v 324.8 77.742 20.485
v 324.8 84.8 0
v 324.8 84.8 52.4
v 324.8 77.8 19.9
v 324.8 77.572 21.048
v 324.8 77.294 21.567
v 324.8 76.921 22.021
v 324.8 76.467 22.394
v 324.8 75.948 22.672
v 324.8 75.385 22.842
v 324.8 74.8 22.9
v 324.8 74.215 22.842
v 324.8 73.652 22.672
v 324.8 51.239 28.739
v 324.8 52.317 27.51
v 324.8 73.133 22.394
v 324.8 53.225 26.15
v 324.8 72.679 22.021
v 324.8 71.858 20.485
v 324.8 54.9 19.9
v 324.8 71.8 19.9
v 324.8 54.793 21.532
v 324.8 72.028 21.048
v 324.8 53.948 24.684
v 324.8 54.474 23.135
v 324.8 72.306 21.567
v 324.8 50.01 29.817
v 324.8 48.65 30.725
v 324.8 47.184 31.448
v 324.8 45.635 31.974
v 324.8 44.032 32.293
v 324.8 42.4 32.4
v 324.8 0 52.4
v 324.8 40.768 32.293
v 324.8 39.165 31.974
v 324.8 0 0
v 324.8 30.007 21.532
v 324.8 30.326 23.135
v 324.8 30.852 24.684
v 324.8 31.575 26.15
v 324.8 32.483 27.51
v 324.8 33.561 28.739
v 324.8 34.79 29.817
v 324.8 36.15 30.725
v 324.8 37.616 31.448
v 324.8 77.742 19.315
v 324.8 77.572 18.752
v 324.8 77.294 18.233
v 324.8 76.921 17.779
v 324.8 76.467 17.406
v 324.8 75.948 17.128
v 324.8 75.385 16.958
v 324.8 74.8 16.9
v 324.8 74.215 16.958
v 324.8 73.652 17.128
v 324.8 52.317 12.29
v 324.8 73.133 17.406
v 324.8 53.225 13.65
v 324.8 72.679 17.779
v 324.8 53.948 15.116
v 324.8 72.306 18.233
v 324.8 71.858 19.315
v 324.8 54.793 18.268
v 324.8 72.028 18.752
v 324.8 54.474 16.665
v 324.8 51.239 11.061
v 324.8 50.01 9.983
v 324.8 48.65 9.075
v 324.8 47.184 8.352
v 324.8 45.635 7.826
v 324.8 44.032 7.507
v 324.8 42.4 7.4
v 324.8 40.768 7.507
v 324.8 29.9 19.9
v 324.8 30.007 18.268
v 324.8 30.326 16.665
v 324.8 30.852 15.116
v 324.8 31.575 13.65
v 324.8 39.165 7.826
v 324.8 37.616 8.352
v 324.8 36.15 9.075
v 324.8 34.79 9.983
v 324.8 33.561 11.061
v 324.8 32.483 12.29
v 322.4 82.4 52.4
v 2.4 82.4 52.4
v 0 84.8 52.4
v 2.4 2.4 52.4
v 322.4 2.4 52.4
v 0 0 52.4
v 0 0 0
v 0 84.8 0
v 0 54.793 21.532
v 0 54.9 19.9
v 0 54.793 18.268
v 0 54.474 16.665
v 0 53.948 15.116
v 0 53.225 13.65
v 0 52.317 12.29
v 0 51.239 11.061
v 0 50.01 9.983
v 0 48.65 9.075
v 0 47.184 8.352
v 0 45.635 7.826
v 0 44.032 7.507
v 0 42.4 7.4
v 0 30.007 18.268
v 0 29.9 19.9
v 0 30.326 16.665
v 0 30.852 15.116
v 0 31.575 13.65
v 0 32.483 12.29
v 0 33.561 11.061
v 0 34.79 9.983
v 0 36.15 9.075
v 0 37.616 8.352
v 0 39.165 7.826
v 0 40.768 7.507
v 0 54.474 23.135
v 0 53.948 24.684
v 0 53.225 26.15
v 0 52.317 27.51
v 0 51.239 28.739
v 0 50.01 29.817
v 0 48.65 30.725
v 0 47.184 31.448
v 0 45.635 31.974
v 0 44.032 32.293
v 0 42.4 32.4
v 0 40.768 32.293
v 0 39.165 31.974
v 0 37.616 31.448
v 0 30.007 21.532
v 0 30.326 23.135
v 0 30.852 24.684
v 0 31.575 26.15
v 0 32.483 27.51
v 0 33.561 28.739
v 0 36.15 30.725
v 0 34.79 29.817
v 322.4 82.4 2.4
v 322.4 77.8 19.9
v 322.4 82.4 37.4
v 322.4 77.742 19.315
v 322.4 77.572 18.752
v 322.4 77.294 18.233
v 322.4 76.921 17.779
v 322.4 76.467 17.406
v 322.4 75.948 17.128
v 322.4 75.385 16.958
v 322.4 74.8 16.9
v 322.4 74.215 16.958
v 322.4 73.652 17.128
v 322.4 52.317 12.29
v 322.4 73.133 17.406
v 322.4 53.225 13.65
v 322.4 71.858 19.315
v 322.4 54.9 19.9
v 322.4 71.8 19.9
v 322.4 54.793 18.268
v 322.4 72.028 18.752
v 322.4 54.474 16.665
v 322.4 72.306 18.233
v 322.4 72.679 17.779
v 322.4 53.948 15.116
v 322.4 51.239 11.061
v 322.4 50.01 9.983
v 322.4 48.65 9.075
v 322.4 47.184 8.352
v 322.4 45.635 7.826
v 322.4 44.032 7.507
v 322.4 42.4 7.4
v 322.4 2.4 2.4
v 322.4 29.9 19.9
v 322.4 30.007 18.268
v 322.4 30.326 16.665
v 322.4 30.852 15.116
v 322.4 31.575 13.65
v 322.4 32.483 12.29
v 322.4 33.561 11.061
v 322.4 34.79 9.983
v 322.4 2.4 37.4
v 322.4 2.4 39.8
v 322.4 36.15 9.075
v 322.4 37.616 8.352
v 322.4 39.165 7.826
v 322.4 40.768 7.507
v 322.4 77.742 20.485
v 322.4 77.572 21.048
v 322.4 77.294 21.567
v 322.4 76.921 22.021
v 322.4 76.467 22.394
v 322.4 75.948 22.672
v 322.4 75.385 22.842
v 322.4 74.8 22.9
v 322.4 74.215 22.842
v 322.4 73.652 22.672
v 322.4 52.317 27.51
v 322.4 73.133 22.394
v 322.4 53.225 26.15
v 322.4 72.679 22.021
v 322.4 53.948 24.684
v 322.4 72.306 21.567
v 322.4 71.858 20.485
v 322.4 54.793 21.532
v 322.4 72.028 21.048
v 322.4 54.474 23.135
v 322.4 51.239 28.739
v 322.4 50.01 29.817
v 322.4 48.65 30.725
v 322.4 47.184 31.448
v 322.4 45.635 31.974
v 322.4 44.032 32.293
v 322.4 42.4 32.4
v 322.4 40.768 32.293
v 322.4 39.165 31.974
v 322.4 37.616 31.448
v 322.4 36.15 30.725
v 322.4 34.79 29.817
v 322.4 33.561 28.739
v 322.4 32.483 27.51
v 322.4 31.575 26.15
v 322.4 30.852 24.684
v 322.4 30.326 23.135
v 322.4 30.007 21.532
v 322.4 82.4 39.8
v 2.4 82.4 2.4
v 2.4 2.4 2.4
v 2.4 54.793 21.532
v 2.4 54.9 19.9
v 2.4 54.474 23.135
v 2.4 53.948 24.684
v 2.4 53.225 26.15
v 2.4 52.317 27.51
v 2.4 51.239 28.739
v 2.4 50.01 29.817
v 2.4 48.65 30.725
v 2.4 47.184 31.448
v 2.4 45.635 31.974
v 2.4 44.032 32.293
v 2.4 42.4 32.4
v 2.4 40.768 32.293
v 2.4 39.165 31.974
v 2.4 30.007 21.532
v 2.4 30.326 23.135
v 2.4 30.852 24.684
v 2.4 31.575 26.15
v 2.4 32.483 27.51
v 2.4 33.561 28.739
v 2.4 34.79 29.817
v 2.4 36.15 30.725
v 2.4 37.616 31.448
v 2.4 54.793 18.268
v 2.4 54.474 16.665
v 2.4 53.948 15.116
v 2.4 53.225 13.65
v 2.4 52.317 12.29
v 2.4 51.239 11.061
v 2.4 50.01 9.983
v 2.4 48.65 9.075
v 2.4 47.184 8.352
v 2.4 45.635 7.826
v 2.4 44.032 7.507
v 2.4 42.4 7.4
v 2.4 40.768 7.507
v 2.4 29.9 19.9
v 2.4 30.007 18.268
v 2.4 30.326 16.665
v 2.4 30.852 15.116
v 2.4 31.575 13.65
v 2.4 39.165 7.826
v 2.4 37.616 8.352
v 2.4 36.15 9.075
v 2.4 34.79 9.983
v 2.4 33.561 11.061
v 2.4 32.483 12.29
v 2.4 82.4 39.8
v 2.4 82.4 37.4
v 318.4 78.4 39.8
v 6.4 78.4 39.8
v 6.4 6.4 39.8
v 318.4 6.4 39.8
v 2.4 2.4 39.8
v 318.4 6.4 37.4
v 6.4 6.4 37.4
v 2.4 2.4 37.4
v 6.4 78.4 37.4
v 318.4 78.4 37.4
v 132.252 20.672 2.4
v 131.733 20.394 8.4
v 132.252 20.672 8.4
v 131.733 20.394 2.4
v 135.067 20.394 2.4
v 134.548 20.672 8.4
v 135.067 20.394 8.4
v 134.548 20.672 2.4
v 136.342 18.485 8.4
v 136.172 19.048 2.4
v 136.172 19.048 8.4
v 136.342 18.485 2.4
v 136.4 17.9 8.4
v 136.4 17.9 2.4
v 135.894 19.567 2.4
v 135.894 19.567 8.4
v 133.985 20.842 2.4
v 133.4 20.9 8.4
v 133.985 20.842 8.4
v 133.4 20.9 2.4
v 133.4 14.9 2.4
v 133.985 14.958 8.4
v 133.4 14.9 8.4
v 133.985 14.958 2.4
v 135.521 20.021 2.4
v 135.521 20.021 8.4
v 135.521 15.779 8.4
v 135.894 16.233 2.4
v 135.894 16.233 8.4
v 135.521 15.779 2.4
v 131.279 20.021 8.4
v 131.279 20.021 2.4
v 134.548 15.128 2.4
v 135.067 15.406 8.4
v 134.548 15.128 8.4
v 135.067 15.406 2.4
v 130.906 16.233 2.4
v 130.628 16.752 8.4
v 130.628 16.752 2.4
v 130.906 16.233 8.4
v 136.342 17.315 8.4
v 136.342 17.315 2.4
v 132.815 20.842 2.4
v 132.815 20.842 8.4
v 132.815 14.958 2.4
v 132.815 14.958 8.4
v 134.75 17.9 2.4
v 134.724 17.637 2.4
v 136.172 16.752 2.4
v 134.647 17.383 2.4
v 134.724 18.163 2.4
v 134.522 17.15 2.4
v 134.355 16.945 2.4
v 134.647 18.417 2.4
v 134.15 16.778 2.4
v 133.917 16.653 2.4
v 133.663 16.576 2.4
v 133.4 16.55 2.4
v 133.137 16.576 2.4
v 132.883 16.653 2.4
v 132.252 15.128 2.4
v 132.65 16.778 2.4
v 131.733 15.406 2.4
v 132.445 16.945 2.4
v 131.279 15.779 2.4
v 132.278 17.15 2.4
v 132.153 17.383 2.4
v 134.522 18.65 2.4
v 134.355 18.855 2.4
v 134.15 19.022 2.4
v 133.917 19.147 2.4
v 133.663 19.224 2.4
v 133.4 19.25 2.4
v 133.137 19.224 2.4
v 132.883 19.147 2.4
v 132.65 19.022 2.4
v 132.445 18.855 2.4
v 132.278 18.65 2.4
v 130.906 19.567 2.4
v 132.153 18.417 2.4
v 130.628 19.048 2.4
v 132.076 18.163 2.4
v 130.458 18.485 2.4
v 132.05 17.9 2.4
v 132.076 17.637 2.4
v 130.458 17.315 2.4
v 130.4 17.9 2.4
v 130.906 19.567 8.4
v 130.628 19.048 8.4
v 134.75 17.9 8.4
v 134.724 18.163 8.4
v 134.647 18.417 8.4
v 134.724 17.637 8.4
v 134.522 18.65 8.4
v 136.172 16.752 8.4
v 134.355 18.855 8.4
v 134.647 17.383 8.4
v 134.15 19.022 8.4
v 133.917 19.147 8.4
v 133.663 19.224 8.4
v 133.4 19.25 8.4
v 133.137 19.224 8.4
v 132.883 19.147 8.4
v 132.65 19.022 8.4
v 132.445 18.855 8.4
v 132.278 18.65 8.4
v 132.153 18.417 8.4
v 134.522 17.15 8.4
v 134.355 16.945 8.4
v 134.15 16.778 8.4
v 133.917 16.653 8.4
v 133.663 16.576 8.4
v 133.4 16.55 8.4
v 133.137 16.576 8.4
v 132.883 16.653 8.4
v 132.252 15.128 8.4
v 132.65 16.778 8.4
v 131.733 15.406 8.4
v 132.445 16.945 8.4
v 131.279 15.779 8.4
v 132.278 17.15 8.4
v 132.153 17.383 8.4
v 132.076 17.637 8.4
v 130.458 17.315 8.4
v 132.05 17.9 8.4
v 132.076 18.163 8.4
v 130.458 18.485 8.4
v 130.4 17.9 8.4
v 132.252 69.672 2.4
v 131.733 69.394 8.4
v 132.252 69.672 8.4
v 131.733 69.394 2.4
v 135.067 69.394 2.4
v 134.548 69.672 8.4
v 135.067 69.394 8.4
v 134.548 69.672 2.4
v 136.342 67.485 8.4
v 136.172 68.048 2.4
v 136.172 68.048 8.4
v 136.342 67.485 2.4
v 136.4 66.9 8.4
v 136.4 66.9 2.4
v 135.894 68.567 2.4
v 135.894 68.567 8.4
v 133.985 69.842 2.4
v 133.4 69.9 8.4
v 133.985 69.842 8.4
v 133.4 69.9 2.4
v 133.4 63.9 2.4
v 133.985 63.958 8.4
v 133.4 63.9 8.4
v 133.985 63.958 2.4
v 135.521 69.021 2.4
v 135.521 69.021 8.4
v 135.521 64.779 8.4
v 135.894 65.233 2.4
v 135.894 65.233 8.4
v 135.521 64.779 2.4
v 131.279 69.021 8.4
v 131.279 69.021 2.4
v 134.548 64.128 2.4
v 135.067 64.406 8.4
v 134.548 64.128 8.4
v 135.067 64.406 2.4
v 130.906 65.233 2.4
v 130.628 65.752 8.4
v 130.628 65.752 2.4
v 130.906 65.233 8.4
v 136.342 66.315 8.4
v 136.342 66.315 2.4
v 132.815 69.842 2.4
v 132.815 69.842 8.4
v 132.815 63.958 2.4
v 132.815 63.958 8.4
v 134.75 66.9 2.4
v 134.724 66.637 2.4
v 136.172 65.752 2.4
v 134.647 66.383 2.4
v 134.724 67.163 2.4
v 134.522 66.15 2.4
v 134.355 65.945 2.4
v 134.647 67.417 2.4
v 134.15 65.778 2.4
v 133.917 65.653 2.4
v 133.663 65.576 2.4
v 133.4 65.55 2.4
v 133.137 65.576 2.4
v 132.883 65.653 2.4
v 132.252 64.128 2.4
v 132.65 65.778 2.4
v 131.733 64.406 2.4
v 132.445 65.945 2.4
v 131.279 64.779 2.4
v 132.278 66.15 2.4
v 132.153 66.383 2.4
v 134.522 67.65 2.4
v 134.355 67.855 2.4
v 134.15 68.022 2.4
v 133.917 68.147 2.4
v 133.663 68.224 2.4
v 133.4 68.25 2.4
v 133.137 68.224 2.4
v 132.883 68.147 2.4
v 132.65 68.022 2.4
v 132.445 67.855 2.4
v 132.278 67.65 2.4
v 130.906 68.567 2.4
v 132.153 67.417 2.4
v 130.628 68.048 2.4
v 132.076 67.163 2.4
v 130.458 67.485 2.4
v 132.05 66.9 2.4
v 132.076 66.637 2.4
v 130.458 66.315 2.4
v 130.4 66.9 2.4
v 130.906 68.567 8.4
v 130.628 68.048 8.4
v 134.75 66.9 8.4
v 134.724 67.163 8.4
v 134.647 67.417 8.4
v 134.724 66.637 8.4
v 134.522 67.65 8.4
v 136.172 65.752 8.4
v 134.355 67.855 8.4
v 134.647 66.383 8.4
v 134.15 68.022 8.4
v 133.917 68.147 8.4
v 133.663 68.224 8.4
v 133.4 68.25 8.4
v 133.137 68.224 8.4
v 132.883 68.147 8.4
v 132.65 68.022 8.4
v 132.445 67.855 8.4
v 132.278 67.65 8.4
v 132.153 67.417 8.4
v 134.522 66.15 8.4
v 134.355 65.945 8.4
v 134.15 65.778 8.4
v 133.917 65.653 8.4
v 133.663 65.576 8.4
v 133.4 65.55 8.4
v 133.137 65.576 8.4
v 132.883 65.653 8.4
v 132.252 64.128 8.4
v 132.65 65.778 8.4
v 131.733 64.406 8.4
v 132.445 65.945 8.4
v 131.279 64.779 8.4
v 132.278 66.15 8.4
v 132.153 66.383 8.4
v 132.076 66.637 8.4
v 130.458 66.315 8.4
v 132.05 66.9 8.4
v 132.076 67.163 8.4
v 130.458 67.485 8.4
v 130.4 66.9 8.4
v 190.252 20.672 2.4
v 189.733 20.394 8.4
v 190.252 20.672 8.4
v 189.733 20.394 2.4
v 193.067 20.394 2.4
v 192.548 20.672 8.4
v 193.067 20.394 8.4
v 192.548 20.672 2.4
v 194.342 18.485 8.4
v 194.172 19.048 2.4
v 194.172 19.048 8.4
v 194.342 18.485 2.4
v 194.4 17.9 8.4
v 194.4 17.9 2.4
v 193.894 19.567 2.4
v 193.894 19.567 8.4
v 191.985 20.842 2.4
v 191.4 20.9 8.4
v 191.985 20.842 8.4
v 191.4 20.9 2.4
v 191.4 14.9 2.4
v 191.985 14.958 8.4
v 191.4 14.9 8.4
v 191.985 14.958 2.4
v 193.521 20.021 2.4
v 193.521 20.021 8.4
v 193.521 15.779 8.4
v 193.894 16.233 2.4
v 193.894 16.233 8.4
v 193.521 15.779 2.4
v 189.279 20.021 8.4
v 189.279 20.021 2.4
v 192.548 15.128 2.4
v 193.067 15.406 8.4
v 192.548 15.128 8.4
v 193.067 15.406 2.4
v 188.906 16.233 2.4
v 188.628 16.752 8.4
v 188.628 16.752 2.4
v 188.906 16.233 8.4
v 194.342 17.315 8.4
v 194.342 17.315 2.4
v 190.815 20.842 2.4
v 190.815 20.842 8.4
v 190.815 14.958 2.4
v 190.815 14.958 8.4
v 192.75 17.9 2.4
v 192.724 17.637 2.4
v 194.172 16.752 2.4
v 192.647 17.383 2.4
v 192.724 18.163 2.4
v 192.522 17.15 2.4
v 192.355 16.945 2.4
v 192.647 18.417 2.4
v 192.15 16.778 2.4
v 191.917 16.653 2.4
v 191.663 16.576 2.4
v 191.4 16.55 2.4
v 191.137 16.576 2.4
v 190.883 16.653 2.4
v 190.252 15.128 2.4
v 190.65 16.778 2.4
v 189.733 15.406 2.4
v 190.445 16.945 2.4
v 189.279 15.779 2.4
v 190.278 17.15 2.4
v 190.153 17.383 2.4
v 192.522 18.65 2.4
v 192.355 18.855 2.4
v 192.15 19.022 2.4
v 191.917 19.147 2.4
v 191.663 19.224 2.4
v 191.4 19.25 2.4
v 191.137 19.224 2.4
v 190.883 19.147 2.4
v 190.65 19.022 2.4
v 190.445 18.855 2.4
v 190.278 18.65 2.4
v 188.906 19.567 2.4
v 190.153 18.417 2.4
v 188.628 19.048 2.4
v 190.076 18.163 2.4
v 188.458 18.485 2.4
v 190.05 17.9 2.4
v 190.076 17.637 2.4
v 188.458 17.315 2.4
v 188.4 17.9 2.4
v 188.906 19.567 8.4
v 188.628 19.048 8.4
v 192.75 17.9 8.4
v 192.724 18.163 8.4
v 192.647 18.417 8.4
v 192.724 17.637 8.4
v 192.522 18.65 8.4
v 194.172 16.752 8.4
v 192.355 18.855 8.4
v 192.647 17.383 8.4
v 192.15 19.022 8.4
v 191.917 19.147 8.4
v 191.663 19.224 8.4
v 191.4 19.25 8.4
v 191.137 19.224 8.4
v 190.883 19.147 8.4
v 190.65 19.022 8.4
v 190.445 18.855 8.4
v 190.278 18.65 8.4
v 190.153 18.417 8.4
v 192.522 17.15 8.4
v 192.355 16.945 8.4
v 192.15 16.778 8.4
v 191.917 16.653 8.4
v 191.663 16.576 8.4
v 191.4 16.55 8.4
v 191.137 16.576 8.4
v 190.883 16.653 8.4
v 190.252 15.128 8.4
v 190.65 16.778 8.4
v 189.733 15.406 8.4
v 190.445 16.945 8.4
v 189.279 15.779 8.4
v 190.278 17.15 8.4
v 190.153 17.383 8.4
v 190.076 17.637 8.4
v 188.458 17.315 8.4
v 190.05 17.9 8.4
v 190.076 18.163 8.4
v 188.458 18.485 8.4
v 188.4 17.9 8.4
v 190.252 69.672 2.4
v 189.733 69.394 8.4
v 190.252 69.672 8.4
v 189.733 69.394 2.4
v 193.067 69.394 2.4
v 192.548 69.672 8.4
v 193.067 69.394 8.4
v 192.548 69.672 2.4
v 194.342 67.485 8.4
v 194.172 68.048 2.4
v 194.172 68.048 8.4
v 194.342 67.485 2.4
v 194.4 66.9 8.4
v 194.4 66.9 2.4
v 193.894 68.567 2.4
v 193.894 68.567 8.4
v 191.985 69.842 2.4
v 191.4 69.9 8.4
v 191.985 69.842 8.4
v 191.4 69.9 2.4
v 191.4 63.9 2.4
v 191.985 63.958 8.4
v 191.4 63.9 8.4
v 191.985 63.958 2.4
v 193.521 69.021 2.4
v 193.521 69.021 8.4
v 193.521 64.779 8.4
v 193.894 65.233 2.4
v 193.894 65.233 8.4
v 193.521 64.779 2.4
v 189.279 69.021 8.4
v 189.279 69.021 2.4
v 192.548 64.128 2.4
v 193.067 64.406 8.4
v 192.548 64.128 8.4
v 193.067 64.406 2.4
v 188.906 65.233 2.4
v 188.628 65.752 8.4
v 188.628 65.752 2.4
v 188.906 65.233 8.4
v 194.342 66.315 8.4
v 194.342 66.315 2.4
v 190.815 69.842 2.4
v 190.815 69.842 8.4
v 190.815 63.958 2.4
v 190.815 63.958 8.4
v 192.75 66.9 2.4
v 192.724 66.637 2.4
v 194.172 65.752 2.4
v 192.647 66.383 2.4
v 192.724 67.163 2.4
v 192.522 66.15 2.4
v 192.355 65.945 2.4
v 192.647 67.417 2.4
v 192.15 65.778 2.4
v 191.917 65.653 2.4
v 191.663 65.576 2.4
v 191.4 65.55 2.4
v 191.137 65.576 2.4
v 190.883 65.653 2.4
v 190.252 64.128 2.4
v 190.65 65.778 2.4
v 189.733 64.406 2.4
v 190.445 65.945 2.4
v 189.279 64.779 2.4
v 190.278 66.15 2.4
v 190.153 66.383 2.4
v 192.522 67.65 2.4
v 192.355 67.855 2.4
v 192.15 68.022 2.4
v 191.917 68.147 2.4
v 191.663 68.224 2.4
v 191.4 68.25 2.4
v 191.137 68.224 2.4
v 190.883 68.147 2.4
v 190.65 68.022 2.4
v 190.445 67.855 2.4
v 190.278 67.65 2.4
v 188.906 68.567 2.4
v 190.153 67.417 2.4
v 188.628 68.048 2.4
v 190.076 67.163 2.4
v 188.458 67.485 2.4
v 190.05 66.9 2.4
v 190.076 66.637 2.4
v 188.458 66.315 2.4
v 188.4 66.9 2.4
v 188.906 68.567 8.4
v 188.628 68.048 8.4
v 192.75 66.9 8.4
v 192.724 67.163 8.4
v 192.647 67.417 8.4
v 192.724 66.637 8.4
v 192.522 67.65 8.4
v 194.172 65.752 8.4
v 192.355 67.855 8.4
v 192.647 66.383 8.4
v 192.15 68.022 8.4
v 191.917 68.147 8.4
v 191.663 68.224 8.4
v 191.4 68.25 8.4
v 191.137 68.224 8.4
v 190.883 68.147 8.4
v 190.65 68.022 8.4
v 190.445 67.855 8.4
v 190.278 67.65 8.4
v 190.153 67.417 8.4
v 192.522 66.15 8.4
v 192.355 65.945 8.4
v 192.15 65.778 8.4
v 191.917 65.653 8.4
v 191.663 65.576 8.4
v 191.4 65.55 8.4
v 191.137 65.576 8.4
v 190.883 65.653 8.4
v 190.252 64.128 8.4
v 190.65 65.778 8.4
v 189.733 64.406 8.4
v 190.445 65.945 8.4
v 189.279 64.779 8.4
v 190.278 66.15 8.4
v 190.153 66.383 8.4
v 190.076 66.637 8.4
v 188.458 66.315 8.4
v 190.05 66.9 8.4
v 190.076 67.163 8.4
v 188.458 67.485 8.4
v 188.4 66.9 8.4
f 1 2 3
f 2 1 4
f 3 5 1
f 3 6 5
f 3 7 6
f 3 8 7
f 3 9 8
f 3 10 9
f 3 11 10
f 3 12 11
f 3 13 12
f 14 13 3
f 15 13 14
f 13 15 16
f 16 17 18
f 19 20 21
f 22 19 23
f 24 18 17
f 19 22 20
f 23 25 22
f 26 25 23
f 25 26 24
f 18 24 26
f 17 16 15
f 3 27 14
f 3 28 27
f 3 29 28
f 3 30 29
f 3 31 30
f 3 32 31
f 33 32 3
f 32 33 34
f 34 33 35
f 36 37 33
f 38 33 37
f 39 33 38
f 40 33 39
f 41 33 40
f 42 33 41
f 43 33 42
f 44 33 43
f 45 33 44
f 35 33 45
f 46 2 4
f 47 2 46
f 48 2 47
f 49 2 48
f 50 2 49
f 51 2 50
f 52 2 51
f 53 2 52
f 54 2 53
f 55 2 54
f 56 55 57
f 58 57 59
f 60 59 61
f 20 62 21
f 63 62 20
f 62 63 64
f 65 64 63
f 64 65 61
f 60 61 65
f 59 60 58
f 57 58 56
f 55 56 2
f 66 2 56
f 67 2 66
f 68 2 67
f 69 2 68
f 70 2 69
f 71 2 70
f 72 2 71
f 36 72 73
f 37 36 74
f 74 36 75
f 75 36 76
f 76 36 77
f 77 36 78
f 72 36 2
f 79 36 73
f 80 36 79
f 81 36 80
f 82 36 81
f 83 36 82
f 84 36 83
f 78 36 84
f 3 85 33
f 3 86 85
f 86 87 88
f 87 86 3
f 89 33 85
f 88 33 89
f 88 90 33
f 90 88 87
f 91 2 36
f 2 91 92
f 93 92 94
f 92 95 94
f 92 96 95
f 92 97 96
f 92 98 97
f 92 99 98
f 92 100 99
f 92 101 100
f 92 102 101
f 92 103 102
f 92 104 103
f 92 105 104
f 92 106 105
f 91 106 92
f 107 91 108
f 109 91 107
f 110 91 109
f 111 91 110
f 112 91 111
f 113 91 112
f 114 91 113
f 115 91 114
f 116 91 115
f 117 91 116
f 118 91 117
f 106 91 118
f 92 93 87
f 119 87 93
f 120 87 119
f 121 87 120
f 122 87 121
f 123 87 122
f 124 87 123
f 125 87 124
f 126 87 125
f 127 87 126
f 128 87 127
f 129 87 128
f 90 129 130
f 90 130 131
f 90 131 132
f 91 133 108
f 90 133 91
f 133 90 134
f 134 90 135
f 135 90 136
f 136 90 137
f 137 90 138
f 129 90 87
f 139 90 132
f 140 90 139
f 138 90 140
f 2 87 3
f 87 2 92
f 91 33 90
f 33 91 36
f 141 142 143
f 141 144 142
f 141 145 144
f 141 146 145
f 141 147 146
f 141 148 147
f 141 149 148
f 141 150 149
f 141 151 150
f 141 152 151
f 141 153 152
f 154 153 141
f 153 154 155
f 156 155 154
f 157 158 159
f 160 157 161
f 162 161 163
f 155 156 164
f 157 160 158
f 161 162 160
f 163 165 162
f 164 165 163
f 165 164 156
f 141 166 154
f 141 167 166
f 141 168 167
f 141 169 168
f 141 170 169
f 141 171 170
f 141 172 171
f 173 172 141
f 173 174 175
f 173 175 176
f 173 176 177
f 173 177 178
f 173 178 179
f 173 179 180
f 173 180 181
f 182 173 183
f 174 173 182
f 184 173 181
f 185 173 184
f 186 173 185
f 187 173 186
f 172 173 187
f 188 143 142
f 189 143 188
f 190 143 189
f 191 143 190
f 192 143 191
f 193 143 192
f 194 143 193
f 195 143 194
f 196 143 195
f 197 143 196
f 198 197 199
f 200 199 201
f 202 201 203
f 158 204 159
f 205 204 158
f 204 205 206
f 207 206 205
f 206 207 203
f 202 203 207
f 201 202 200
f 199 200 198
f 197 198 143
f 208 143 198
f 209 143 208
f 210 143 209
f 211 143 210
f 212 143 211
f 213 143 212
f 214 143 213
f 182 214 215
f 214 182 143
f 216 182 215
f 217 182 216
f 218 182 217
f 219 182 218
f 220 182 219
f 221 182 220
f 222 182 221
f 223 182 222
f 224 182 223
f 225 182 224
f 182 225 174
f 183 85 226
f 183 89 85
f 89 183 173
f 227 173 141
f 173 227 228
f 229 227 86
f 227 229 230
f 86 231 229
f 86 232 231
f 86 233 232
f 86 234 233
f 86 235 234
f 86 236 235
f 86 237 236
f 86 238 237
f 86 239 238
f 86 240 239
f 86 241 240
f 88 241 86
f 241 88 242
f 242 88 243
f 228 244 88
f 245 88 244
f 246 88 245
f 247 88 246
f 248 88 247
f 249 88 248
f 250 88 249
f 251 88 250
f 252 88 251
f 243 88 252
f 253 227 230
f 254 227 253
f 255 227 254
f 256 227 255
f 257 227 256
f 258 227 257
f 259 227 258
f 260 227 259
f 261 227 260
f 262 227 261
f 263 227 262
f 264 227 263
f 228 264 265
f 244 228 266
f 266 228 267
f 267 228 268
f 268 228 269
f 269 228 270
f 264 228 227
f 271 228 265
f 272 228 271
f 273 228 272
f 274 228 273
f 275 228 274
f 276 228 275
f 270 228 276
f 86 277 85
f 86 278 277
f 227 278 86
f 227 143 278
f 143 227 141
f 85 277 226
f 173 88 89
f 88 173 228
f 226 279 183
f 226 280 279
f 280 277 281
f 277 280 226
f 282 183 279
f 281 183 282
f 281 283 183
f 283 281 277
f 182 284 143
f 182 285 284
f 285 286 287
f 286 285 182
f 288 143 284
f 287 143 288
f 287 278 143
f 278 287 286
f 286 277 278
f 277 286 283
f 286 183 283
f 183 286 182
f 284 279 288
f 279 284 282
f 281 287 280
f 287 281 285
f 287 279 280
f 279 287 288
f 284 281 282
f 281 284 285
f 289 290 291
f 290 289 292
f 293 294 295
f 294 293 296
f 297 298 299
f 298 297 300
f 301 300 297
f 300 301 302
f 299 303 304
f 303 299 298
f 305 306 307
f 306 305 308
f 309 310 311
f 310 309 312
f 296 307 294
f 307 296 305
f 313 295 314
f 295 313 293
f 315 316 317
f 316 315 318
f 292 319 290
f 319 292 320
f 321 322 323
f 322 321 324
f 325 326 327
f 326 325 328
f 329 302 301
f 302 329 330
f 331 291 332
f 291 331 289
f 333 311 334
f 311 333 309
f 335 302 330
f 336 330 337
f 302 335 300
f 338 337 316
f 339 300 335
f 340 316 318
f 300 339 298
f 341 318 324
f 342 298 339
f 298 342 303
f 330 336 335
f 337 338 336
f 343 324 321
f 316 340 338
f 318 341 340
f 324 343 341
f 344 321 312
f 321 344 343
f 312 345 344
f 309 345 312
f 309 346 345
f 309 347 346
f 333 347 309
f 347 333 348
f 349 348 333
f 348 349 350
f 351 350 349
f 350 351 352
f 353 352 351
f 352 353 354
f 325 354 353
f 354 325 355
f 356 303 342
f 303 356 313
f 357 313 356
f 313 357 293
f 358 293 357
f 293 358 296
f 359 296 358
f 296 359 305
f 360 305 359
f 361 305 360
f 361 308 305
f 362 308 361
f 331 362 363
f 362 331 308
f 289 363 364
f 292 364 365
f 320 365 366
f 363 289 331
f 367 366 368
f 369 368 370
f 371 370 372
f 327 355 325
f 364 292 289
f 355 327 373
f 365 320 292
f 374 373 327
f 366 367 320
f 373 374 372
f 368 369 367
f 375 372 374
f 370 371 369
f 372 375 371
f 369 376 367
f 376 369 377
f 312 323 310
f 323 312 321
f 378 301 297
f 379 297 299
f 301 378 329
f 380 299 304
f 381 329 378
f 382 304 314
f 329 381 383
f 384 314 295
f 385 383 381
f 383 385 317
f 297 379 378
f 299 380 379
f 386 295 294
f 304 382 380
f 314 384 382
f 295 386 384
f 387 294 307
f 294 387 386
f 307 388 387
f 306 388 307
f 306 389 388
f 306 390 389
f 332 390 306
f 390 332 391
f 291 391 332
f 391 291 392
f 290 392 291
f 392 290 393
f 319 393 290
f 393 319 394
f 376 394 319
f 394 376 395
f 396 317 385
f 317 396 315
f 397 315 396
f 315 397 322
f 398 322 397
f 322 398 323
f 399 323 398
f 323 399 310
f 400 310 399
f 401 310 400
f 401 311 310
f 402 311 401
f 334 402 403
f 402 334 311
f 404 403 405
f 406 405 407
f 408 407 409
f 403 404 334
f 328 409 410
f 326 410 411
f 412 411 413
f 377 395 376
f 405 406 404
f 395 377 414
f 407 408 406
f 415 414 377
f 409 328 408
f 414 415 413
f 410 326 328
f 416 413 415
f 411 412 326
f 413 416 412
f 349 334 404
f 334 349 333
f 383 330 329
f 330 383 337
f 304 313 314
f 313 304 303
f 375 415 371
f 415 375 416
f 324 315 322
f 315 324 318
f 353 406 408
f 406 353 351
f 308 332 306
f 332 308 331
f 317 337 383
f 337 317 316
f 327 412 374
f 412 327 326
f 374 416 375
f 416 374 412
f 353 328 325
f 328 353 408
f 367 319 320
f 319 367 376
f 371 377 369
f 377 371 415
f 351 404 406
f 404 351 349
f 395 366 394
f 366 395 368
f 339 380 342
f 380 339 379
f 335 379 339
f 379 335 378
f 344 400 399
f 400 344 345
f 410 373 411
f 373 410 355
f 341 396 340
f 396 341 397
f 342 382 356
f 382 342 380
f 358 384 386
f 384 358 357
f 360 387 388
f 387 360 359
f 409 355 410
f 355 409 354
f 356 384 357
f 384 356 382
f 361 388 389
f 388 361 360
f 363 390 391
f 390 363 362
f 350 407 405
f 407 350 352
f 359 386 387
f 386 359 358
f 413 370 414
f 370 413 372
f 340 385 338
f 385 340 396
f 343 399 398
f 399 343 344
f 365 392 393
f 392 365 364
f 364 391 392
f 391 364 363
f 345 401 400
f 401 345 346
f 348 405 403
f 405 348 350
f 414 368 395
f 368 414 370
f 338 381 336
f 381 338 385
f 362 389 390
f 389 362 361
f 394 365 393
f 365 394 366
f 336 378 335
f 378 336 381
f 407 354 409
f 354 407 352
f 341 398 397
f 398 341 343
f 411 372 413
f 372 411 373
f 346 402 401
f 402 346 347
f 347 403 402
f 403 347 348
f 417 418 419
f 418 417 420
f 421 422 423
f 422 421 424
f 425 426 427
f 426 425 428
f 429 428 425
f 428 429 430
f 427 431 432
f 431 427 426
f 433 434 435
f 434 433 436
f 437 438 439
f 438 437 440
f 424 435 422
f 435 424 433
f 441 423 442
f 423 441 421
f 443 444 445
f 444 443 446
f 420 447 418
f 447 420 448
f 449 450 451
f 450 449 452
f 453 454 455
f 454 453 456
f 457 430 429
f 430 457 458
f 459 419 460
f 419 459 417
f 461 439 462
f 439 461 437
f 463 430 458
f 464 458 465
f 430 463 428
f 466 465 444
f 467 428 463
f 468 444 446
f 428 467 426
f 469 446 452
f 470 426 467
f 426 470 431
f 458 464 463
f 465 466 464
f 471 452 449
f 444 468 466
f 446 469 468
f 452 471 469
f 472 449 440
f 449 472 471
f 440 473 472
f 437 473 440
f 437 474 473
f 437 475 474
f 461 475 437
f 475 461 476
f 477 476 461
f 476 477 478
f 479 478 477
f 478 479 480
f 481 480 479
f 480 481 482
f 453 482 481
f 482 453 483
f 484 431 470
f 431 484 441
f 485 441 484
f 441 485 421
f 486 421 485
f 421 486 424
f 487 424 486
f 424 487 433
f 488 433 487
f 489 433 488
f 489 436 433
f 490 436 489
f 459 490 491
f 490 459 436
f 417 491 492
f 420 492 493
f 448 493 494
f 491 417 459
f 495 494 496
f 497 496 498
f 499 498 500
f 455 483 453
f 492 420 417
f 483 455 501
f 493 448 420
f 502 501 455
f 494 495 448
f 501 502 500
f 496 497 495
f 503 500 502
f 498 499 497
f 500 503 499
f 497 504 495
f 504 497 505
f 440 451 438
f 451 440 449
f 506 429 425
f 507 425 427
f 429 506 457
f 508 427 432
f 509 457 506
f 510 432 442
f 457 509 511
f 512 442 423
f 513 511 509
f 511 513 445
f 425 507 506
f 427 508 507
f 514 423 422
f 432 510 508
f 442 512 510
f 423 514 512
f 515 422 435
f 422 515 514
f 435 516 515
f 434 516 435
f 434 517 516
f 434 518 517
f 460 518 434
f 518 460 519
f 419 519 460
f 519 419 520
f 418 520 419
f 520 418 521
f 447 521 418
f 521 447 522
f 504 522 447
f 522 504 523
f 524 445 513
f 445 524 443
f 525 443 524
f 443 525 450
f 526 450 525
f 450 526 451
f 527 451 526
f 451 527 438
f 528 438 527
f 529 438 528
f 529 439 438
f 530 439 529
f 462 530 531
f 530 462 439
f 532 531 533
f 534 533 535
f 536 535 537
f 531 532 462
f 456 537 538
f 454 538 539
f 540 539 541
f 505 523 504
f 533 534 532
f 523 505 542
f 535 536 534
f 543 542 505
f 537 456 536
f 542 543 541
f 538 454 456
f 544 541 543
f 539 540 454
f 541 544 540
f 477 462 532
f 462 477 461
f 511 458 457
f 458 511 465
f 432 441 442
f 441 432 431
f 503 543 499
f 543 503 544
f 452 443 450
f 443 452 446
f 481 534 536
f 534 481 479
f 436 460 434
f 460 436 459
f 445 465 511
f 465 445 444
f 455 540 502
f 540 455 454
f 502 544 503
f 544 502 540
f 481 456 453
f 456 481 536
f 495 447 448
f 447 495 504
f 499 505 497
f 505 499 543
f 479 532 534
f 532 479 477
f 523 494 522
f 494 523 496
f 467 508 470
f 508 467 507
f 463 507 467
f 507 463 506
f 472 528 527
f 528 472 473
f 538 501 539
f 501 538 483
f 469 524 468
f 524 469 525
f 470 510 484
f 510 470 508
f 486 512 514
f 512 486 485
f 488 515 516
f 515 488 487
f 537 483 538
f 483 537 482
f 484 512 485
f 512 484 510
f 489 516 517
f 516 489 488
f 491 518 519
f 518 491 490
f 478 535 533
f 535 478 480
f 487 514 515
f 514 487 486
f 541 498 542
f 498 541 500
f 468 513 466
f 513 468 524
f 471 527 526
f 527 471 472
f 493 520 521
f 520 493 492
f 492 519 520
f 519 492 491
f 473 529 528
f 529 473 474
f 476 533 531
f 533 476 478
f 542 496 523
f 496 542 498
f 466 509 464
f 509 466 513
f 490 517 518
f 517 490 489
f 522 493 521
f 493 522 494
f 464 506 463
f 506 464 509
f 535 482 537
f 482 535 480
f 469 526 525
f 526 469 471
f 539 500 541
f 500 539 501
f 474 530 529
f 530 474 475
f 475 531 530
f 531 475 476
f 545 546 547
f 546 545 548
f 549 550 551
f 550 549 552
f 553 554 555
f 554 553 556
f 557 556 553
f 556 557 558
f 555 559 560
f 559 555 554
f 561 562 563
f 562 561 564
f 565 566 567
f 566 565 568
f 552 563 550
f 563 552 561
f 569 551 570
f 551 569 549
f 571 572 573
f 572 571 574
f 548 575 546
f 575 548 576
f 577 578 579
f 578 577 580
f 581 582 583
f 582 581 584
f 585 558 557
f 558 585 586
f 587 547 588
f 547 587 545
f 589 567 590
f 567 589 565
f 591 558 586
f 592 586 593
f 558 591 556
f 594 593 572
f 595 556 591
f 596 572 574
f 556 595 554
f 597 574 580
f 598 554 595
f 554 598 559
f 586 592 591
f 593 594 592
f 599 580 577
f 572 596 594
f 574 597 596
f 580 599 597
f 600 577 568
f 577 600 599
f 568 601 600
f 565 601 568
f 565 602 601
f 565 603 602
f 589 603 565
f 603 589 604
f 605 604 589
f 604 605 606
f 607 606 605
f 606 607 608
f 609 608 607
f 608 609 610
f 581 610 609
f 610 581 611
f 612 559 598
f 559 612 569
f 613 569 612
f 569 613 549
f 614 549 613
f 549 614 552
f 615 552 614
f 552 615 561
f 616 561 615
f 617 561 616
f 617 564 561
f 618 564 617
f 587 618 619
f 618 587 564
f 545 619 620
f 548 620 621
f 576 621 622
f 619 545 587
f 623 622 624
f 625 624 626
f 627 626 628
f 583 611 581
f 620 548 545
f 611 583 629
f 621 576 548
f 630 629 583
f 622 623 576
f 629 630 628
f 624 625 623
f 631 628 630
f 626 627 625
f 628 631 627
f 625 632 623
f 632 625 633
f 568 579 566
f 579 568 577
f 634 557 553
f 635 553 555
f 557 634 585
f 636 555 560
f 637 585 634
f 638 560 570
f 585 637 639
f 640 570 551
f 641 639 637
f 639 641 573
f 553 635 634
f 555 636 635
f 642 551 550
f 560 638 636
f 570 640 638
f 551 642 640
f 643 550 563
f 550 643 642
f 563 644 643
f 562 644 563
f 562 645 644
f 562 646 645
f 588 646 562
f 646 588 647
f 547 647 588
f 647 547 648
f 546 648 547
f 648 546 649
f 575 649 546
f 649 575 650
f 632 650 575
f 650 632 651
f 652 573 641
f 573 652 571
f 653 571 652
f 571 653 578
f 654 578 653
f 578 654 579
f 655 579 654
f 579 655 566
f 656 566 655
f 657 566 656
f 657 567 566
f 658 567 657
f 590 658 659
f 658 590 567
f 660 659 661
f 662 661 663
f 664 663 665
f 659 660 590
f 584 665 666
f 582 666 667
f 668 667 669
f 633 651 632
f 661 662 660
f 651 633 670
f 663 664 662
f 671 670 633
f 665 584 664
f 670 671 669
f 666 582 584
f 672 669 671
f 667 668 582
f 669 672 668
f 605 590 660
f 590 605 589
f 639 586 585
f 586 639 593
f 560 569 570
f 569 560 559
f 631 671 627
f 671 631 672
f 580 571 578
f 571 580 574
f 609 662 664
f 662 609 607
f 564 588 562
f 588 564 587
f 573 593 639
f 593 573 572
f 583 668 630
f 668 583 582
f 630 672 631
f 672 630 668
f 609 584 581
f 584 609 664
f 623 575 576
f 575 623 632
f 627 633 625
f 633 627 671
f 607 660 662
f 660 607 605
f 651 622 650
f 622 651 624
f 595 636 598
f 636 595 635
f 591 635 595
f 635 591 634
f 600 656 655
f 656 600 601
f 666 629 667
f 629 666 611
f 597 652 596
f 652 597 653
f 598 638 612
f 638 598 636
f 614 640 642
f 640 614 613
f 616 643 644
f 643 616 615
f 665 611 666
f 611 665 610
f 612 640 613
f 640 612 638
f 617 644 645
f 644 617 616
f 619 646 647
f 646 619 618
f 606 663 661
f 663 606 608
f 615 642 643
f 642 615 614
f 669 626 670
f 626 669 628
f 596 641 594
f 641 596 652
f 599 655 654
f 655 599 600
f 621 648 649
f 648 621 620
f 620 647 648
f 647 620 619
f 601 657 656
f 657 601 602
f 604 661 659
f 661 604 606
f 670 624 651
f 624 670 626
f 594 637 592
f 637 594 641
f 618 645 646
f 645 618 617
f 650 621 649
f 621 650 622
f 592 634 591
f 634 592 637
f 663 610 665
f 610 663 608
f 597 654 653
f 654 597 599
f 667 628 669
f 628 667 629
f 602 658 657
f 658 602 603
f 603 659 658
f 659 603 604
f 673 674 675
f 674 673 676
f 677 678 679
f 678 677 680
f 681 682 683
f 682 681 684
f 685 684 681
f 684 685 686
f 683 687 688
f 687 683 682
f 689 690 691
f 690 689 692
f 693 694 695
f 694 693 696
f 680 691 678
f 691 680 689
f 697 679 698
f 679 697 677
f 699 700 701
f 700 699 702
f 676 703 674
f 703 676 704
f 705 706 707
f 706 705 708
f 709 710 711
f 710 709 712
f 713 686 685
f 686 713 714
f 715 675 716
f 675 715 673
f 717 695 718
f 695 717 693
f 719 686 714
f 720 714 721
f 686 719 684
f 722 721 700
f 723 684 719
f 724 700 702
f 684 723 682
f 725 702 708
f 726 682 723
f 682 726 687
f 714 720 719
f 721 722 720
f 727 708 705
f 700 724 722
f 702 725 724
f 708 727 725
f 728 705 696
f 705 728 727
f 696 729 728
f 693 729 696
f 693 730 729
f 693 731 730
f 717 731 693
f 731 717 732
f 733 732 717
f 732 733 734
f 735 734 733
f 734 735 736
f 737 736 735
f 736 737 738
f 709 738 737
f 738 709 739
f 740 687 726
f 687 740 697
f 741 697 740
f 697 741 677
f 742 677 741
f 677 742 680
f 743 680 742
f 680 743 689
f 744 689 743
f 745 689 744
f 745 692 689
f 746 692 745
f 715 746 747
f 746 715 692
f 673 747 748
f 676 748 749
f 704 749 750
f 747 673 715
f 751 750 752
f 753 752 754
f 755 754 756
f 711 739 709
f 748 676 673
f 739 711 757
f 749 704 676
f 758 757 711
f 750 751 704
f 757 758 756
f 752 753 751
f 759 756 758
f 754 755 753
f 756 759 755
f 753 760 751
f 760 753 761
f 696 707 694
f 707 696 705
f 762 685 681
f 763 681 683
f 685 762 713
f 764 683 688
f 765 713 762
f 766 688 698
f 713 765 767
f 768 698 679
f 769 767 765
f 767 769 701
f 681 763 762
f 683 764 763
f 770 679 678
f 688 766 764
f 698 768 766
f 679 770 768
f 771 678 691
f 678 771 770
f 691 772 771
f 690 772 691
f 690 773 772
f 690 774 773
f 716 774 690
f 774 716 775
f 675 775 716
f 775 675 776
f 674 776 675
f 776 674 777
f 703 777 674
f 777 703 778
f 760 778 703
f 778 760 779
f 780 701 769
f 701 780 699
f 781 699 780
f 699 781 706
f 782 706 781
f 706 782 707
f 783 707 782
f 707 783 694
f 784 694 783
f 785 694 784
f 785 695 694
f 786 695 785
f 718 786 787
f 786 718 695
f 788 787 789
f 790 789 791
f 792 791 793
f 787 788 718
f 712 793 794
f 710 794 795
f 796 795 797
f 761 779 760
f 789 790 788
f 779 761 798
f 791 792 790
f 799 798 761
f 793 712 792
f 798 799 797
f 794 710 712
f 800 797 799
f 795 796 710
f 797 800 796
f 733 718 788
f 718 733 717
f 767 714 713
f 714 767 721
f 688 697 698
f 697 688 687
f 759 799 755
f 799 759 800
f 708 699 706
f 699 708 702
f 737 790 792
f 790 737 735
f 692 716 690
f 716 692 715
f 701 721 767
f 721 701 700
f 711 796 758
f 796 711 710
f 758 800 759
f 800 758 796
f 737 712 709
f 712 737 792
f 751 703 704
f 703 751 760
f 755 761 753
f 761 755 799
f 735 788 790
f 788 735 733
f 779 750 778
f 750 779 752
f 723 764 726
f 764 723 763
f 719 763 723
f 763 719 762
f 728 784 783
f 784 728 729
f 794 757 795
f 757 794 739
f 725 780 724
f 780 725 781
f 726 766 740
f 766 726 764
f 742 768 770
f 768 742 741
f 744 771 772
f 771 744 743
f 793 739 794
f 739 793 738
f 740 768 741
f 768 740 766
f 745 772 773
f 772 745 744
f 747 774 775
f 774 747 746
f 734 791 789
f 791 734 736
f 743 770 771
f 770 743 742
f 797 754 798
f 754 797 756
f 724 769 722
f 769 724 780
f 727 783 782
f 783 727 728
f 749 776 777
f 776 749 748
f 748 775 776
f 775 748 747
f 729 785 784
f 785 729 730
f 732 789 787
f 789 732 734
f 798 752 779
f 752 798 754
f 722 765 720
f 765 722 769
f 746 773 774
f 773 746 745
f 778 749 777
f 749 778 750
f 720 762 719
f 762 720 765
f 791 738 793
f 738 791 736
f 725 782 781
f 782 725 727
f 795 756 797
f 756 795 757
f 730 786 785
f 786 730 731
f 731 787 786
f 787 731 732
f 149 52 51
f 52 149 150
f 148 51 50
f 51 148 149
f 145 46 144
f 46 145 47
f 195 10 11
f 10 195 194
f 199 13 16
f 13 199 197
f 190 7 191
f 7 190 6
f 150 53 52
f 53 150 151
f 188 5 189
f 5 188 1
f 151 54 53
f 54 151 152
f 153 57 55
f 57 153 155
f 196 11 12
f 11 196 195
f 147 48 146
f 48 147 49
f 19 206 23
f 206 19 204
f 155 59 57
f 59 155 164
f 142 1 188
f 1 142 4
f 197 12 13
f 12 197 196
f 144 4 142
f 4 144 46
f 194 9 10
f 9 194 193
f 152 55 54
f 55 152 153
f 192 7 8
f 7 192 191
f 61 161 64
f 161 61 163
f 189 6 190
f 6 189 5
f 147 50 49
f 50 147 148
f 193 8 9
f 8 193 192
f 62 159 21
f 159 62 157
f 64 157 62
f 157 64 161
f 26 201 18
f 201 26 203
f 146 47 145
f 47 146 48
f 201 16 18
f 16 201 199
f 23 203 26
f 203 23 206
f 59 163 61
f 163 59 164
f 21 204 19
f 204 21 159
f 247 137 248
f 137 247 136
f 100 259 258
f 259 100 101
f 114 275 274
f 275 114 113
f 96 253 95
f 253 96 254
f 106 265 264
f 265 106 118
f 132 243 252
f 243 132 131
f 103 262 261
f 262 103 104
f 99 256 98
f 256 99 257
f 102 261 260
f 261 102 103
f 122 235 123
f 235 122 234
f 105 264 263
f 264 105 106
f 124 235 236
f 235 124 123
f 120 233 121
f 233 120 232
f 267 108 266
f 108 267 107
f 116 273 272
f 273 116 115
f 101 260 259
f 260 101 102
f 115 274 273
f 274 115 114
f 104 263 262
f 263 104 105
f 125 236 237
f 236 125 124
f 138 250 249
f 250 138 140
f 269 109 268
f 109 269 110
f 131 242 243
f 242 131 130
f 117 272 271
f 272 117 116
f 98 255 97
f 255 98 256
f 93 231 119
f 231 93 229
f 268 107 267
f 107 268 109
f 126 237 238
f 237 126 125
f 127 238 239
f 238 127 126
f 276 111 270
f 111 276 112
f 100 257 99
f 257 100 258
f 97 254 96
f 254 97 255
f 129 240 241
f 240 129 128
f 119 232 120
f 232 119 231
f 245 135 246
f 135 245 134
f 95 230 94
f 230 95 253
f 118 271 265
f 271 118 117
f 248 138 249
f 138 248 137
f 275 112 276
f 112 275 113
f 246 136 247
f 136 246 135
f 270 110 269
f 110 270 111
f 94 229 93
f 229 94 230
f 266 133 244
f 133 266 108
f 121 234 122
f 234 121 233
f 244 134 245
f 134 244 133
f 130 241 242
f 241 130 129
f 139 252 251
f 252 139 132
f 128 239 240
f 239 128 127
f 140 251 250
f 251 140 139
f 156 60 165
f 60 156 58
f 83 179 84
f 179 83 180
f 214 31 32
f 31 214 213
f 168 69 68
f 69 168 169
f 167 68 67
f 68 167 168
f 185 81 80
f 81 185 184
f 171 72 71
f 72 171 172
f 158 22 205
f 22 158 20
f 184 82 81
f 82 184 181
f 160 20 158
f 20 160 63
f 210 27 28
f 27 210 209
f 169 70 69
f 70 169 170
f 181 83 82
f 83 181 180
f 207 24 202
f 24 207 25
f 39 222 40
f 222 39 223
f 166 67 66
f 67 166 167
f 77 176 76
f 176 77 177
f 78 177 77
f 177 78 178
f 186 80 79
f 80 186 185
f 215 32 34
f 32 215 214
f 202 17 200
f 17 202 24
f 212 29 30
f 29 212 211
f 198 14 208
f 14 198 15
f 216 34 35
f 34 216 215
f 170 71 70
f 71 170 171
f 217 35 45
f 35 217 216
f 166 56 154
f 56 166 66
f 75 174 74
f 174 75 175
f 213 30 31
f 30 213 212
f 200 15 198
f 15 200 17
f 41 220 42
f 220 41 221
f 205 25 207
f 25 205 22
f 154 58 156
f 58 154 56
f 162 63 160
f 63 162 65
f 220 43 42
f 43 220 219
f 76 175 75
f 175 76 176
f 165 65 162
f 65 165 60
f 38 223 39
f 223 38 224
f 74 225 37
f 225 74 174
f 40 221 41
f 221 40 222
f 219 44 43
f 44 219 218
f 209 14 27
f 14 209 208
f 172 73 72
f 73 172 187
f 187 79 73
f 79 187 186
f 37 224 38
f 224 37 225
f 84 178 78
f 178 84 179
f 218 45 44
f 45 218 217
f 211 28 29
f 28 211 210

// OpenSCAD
// NHL Scoreboard enclosure -- holds a Raspberry Pi 4 and the HUB75 LED
// panel(s) behind a shared front frame. Cable, vent, and mounting-access
// holes are deliberately NOT modeled yet -- this is a first-pass shell to
// confirm overall size before adding that detail.
//
// Orientation: z=0 is the back wall (Pi side); the front (z=outer_d) is
// fully open so the panel's LED face shows through. Prints flat, back
// face down, no overhangs beyond 45 degrees -- no supports needed.

// ---- panel (from the purchased spec sheet, CLAUDE.md Hardware facts) --
panel_w    = 160;  // mm, one panel
panel_h    = 80;   // mm
panel_count = 2;   // chained horizontally, matches PanelConfig.chain_length
panel_gap  = 0;    // mm between chained panels, if any
// Not on the spec sheet -- measure the real panel (PCB + connectors) and
// correct this before printing for a final fit.
panel_depth = 15;

// ---- Raspberry Pi 4 Model B (official mechanical spec) -----------------
pi_w            = 85;
pi_h            = 56;
pi_hole_dx      = 58;  // mounting hole spacing
pi_hole_dy      = 49;
pi_hole_inset_x = (pi_w - pi_hole_dx) / 2;
pi_hole_inset_y = (pi_h - pi_hole_dy) / 2;
pi_hole_d       = 2.7;
pi_standoff_h   = 6;   // clearance under the board for underside components
pi_standoff_d   = 6;

// ---- ambient light sensor (#44/#45 -- auto-dimming) ---------------------
// #45 landed a BH1750 over I2C -- still sized generically since the
// exact breakout board's dimensions aren't pinned down, but no longer a
// stand-in for an unknown part. Through the right side wall, near the
// top edge (moved down from centre to leave the wall's vertical middle
// clear for the speaker hole below) -- positioned at electronics-bay
// depth (behind panel_seat_z, not within the panel's own depth range)
// so the panel itself doesn't sit right in front of the hole.
sensor_hole_d = 6;
sensor_margin_top = 10;  // mm from the top edge to the hole centre

// ---- speaker holes (both sides) ------------------------------------------
// Provisional: no speaker driver picked yet, so this is a generic round
// port, not a grille cut for a specific model -- revisit once one's
// chosen. Centred vertically on each side wall (the sensor moved up to
// make room), same electronics-bay depth as the sensor so neither sits
// in front of the panel.
speaker_hole_d = 25;

// ---- enclosure -----------------------------------------------------------
wall = 2.4;  // ~6 perimeters at a 0.4mm nozzle
lip  = 4;    // how far the front ledge overlaps the panel edge, each side
// The bay has to be at least as deep as the biggest side hole plus a
// margin on each side of it, or that hole pokes through the back wall
// or into the panel's seat -- derived from speaker_hole_d rather than a
// fixed number so this can't silently break again if a hole size changes.
hole_margin = 5;
electronics_clearance = max(20, speaker_hole_d + hole_margin * 2);

total_panel_w = panel_w * panel_count + panel_gap * (panel_count - 1);
inner_w = total_panel_w;
inner_h = panel_h;
inner_d = electronics_clearance + panel_depth;

outer_w = inner_w + wall * 2;
outer_h = inner_h + wall * 2;
outer_d = inner_d + wall;  // one wall (back) -- front stays open

// z where the panel's back face sits -- the ledge holds it here
panel_seat_z = wall + electronics_clearance;

module shell() {
    difference() {
        cube([outer_w, outer_h, outer_d]);
        // Hollow it out; extend past outer_d so the front is fully open
        // rather than leaving a thin front wall.
        translate([wall, wall, wall])
            cube([inner_w, inner_h, outer_d]);
    }
}

module panel_ledge() {
    // A step at panel_seat_z the panel(s) rest against from the front,
    // `lip` mm wide on each side -- keeps them from falling through to
    // the electronics bay.
    translate([wall, wall, panel_seat_z])
        difference() {
            cube([inner_w, inner_h, wall]);
            translate([lip, lip, -1])
                cube([inner_w - lip * 2, inner_h - lip * 2, wall + 2]);
        }
}

module pi_standoffs() {
    x0 = wall + (inner_w - pi_w) / 2 + pi_hole_inset_x;
    y0 = wall + (inner_h - pi_h) / 2 + pi_hole_inset_y;
    for (dx = [0, pi_hole_dx])
        for (dy = [0, pi_hole_dy])
            translate([x0 + dx, y0 + dy, wall])
                difference() {
                    cylinder(h = pi_standoff_h, d = pi_standoff_d, $fn = 32);
                    cylinder(h = pi_standoff_h + 1, d = pi_hole_d, $fn = 32);
                }
}

module sensor_hole() {
    // Drilled through the right wall, near the top edge, centered in the
    // electronics bay's depth (not the panel's) so the panel isn't
    // sitting right in front of the hole. rotate([0,90,0]) maps the
    // cylinder's local +z (its extrusion axis) onto global +x, so it
    // must start 1mm before the wall's inner face to fully clear both
    // faces after the wall + 2mm cylinder length.
    translate([outer_w - wall - 1, outer_h - sensor_margin_top, wall + electronics_clearance / 2])
        rotate([0, 90, 0])
            cylinder(h = wall + 2, d = sensor_hole_d, $fn = 32);
}

module speaker_hole(side) {
    // side = "left" or "right". Same rotate([0,90,0]) approach as
    // sensor_hole() -- local +z maps onto global +x, so the start x
    // differs by which face is being cut: 1mm outside the outer face on
    // the near side for the right wall, or 1mm outside the outer face on
    // the far (negative) side for the left wall.
    x0 = side == "right" ? outer_w - wall - 1 : -1;
    translate([x0, outer_h / 2, wall + electronics_clearance / 2])
        rotate([0, 90, 0])
            cylinder(h = wall + 2, d = speaker_hole_d, $fn = 48);
}

difference() {
    union() {
        shell();
        panel_ledge();
        pi_standoffs();
    }
    sensor_hole();
    speaker_hole("left");
    speaker_hole("right");
}
